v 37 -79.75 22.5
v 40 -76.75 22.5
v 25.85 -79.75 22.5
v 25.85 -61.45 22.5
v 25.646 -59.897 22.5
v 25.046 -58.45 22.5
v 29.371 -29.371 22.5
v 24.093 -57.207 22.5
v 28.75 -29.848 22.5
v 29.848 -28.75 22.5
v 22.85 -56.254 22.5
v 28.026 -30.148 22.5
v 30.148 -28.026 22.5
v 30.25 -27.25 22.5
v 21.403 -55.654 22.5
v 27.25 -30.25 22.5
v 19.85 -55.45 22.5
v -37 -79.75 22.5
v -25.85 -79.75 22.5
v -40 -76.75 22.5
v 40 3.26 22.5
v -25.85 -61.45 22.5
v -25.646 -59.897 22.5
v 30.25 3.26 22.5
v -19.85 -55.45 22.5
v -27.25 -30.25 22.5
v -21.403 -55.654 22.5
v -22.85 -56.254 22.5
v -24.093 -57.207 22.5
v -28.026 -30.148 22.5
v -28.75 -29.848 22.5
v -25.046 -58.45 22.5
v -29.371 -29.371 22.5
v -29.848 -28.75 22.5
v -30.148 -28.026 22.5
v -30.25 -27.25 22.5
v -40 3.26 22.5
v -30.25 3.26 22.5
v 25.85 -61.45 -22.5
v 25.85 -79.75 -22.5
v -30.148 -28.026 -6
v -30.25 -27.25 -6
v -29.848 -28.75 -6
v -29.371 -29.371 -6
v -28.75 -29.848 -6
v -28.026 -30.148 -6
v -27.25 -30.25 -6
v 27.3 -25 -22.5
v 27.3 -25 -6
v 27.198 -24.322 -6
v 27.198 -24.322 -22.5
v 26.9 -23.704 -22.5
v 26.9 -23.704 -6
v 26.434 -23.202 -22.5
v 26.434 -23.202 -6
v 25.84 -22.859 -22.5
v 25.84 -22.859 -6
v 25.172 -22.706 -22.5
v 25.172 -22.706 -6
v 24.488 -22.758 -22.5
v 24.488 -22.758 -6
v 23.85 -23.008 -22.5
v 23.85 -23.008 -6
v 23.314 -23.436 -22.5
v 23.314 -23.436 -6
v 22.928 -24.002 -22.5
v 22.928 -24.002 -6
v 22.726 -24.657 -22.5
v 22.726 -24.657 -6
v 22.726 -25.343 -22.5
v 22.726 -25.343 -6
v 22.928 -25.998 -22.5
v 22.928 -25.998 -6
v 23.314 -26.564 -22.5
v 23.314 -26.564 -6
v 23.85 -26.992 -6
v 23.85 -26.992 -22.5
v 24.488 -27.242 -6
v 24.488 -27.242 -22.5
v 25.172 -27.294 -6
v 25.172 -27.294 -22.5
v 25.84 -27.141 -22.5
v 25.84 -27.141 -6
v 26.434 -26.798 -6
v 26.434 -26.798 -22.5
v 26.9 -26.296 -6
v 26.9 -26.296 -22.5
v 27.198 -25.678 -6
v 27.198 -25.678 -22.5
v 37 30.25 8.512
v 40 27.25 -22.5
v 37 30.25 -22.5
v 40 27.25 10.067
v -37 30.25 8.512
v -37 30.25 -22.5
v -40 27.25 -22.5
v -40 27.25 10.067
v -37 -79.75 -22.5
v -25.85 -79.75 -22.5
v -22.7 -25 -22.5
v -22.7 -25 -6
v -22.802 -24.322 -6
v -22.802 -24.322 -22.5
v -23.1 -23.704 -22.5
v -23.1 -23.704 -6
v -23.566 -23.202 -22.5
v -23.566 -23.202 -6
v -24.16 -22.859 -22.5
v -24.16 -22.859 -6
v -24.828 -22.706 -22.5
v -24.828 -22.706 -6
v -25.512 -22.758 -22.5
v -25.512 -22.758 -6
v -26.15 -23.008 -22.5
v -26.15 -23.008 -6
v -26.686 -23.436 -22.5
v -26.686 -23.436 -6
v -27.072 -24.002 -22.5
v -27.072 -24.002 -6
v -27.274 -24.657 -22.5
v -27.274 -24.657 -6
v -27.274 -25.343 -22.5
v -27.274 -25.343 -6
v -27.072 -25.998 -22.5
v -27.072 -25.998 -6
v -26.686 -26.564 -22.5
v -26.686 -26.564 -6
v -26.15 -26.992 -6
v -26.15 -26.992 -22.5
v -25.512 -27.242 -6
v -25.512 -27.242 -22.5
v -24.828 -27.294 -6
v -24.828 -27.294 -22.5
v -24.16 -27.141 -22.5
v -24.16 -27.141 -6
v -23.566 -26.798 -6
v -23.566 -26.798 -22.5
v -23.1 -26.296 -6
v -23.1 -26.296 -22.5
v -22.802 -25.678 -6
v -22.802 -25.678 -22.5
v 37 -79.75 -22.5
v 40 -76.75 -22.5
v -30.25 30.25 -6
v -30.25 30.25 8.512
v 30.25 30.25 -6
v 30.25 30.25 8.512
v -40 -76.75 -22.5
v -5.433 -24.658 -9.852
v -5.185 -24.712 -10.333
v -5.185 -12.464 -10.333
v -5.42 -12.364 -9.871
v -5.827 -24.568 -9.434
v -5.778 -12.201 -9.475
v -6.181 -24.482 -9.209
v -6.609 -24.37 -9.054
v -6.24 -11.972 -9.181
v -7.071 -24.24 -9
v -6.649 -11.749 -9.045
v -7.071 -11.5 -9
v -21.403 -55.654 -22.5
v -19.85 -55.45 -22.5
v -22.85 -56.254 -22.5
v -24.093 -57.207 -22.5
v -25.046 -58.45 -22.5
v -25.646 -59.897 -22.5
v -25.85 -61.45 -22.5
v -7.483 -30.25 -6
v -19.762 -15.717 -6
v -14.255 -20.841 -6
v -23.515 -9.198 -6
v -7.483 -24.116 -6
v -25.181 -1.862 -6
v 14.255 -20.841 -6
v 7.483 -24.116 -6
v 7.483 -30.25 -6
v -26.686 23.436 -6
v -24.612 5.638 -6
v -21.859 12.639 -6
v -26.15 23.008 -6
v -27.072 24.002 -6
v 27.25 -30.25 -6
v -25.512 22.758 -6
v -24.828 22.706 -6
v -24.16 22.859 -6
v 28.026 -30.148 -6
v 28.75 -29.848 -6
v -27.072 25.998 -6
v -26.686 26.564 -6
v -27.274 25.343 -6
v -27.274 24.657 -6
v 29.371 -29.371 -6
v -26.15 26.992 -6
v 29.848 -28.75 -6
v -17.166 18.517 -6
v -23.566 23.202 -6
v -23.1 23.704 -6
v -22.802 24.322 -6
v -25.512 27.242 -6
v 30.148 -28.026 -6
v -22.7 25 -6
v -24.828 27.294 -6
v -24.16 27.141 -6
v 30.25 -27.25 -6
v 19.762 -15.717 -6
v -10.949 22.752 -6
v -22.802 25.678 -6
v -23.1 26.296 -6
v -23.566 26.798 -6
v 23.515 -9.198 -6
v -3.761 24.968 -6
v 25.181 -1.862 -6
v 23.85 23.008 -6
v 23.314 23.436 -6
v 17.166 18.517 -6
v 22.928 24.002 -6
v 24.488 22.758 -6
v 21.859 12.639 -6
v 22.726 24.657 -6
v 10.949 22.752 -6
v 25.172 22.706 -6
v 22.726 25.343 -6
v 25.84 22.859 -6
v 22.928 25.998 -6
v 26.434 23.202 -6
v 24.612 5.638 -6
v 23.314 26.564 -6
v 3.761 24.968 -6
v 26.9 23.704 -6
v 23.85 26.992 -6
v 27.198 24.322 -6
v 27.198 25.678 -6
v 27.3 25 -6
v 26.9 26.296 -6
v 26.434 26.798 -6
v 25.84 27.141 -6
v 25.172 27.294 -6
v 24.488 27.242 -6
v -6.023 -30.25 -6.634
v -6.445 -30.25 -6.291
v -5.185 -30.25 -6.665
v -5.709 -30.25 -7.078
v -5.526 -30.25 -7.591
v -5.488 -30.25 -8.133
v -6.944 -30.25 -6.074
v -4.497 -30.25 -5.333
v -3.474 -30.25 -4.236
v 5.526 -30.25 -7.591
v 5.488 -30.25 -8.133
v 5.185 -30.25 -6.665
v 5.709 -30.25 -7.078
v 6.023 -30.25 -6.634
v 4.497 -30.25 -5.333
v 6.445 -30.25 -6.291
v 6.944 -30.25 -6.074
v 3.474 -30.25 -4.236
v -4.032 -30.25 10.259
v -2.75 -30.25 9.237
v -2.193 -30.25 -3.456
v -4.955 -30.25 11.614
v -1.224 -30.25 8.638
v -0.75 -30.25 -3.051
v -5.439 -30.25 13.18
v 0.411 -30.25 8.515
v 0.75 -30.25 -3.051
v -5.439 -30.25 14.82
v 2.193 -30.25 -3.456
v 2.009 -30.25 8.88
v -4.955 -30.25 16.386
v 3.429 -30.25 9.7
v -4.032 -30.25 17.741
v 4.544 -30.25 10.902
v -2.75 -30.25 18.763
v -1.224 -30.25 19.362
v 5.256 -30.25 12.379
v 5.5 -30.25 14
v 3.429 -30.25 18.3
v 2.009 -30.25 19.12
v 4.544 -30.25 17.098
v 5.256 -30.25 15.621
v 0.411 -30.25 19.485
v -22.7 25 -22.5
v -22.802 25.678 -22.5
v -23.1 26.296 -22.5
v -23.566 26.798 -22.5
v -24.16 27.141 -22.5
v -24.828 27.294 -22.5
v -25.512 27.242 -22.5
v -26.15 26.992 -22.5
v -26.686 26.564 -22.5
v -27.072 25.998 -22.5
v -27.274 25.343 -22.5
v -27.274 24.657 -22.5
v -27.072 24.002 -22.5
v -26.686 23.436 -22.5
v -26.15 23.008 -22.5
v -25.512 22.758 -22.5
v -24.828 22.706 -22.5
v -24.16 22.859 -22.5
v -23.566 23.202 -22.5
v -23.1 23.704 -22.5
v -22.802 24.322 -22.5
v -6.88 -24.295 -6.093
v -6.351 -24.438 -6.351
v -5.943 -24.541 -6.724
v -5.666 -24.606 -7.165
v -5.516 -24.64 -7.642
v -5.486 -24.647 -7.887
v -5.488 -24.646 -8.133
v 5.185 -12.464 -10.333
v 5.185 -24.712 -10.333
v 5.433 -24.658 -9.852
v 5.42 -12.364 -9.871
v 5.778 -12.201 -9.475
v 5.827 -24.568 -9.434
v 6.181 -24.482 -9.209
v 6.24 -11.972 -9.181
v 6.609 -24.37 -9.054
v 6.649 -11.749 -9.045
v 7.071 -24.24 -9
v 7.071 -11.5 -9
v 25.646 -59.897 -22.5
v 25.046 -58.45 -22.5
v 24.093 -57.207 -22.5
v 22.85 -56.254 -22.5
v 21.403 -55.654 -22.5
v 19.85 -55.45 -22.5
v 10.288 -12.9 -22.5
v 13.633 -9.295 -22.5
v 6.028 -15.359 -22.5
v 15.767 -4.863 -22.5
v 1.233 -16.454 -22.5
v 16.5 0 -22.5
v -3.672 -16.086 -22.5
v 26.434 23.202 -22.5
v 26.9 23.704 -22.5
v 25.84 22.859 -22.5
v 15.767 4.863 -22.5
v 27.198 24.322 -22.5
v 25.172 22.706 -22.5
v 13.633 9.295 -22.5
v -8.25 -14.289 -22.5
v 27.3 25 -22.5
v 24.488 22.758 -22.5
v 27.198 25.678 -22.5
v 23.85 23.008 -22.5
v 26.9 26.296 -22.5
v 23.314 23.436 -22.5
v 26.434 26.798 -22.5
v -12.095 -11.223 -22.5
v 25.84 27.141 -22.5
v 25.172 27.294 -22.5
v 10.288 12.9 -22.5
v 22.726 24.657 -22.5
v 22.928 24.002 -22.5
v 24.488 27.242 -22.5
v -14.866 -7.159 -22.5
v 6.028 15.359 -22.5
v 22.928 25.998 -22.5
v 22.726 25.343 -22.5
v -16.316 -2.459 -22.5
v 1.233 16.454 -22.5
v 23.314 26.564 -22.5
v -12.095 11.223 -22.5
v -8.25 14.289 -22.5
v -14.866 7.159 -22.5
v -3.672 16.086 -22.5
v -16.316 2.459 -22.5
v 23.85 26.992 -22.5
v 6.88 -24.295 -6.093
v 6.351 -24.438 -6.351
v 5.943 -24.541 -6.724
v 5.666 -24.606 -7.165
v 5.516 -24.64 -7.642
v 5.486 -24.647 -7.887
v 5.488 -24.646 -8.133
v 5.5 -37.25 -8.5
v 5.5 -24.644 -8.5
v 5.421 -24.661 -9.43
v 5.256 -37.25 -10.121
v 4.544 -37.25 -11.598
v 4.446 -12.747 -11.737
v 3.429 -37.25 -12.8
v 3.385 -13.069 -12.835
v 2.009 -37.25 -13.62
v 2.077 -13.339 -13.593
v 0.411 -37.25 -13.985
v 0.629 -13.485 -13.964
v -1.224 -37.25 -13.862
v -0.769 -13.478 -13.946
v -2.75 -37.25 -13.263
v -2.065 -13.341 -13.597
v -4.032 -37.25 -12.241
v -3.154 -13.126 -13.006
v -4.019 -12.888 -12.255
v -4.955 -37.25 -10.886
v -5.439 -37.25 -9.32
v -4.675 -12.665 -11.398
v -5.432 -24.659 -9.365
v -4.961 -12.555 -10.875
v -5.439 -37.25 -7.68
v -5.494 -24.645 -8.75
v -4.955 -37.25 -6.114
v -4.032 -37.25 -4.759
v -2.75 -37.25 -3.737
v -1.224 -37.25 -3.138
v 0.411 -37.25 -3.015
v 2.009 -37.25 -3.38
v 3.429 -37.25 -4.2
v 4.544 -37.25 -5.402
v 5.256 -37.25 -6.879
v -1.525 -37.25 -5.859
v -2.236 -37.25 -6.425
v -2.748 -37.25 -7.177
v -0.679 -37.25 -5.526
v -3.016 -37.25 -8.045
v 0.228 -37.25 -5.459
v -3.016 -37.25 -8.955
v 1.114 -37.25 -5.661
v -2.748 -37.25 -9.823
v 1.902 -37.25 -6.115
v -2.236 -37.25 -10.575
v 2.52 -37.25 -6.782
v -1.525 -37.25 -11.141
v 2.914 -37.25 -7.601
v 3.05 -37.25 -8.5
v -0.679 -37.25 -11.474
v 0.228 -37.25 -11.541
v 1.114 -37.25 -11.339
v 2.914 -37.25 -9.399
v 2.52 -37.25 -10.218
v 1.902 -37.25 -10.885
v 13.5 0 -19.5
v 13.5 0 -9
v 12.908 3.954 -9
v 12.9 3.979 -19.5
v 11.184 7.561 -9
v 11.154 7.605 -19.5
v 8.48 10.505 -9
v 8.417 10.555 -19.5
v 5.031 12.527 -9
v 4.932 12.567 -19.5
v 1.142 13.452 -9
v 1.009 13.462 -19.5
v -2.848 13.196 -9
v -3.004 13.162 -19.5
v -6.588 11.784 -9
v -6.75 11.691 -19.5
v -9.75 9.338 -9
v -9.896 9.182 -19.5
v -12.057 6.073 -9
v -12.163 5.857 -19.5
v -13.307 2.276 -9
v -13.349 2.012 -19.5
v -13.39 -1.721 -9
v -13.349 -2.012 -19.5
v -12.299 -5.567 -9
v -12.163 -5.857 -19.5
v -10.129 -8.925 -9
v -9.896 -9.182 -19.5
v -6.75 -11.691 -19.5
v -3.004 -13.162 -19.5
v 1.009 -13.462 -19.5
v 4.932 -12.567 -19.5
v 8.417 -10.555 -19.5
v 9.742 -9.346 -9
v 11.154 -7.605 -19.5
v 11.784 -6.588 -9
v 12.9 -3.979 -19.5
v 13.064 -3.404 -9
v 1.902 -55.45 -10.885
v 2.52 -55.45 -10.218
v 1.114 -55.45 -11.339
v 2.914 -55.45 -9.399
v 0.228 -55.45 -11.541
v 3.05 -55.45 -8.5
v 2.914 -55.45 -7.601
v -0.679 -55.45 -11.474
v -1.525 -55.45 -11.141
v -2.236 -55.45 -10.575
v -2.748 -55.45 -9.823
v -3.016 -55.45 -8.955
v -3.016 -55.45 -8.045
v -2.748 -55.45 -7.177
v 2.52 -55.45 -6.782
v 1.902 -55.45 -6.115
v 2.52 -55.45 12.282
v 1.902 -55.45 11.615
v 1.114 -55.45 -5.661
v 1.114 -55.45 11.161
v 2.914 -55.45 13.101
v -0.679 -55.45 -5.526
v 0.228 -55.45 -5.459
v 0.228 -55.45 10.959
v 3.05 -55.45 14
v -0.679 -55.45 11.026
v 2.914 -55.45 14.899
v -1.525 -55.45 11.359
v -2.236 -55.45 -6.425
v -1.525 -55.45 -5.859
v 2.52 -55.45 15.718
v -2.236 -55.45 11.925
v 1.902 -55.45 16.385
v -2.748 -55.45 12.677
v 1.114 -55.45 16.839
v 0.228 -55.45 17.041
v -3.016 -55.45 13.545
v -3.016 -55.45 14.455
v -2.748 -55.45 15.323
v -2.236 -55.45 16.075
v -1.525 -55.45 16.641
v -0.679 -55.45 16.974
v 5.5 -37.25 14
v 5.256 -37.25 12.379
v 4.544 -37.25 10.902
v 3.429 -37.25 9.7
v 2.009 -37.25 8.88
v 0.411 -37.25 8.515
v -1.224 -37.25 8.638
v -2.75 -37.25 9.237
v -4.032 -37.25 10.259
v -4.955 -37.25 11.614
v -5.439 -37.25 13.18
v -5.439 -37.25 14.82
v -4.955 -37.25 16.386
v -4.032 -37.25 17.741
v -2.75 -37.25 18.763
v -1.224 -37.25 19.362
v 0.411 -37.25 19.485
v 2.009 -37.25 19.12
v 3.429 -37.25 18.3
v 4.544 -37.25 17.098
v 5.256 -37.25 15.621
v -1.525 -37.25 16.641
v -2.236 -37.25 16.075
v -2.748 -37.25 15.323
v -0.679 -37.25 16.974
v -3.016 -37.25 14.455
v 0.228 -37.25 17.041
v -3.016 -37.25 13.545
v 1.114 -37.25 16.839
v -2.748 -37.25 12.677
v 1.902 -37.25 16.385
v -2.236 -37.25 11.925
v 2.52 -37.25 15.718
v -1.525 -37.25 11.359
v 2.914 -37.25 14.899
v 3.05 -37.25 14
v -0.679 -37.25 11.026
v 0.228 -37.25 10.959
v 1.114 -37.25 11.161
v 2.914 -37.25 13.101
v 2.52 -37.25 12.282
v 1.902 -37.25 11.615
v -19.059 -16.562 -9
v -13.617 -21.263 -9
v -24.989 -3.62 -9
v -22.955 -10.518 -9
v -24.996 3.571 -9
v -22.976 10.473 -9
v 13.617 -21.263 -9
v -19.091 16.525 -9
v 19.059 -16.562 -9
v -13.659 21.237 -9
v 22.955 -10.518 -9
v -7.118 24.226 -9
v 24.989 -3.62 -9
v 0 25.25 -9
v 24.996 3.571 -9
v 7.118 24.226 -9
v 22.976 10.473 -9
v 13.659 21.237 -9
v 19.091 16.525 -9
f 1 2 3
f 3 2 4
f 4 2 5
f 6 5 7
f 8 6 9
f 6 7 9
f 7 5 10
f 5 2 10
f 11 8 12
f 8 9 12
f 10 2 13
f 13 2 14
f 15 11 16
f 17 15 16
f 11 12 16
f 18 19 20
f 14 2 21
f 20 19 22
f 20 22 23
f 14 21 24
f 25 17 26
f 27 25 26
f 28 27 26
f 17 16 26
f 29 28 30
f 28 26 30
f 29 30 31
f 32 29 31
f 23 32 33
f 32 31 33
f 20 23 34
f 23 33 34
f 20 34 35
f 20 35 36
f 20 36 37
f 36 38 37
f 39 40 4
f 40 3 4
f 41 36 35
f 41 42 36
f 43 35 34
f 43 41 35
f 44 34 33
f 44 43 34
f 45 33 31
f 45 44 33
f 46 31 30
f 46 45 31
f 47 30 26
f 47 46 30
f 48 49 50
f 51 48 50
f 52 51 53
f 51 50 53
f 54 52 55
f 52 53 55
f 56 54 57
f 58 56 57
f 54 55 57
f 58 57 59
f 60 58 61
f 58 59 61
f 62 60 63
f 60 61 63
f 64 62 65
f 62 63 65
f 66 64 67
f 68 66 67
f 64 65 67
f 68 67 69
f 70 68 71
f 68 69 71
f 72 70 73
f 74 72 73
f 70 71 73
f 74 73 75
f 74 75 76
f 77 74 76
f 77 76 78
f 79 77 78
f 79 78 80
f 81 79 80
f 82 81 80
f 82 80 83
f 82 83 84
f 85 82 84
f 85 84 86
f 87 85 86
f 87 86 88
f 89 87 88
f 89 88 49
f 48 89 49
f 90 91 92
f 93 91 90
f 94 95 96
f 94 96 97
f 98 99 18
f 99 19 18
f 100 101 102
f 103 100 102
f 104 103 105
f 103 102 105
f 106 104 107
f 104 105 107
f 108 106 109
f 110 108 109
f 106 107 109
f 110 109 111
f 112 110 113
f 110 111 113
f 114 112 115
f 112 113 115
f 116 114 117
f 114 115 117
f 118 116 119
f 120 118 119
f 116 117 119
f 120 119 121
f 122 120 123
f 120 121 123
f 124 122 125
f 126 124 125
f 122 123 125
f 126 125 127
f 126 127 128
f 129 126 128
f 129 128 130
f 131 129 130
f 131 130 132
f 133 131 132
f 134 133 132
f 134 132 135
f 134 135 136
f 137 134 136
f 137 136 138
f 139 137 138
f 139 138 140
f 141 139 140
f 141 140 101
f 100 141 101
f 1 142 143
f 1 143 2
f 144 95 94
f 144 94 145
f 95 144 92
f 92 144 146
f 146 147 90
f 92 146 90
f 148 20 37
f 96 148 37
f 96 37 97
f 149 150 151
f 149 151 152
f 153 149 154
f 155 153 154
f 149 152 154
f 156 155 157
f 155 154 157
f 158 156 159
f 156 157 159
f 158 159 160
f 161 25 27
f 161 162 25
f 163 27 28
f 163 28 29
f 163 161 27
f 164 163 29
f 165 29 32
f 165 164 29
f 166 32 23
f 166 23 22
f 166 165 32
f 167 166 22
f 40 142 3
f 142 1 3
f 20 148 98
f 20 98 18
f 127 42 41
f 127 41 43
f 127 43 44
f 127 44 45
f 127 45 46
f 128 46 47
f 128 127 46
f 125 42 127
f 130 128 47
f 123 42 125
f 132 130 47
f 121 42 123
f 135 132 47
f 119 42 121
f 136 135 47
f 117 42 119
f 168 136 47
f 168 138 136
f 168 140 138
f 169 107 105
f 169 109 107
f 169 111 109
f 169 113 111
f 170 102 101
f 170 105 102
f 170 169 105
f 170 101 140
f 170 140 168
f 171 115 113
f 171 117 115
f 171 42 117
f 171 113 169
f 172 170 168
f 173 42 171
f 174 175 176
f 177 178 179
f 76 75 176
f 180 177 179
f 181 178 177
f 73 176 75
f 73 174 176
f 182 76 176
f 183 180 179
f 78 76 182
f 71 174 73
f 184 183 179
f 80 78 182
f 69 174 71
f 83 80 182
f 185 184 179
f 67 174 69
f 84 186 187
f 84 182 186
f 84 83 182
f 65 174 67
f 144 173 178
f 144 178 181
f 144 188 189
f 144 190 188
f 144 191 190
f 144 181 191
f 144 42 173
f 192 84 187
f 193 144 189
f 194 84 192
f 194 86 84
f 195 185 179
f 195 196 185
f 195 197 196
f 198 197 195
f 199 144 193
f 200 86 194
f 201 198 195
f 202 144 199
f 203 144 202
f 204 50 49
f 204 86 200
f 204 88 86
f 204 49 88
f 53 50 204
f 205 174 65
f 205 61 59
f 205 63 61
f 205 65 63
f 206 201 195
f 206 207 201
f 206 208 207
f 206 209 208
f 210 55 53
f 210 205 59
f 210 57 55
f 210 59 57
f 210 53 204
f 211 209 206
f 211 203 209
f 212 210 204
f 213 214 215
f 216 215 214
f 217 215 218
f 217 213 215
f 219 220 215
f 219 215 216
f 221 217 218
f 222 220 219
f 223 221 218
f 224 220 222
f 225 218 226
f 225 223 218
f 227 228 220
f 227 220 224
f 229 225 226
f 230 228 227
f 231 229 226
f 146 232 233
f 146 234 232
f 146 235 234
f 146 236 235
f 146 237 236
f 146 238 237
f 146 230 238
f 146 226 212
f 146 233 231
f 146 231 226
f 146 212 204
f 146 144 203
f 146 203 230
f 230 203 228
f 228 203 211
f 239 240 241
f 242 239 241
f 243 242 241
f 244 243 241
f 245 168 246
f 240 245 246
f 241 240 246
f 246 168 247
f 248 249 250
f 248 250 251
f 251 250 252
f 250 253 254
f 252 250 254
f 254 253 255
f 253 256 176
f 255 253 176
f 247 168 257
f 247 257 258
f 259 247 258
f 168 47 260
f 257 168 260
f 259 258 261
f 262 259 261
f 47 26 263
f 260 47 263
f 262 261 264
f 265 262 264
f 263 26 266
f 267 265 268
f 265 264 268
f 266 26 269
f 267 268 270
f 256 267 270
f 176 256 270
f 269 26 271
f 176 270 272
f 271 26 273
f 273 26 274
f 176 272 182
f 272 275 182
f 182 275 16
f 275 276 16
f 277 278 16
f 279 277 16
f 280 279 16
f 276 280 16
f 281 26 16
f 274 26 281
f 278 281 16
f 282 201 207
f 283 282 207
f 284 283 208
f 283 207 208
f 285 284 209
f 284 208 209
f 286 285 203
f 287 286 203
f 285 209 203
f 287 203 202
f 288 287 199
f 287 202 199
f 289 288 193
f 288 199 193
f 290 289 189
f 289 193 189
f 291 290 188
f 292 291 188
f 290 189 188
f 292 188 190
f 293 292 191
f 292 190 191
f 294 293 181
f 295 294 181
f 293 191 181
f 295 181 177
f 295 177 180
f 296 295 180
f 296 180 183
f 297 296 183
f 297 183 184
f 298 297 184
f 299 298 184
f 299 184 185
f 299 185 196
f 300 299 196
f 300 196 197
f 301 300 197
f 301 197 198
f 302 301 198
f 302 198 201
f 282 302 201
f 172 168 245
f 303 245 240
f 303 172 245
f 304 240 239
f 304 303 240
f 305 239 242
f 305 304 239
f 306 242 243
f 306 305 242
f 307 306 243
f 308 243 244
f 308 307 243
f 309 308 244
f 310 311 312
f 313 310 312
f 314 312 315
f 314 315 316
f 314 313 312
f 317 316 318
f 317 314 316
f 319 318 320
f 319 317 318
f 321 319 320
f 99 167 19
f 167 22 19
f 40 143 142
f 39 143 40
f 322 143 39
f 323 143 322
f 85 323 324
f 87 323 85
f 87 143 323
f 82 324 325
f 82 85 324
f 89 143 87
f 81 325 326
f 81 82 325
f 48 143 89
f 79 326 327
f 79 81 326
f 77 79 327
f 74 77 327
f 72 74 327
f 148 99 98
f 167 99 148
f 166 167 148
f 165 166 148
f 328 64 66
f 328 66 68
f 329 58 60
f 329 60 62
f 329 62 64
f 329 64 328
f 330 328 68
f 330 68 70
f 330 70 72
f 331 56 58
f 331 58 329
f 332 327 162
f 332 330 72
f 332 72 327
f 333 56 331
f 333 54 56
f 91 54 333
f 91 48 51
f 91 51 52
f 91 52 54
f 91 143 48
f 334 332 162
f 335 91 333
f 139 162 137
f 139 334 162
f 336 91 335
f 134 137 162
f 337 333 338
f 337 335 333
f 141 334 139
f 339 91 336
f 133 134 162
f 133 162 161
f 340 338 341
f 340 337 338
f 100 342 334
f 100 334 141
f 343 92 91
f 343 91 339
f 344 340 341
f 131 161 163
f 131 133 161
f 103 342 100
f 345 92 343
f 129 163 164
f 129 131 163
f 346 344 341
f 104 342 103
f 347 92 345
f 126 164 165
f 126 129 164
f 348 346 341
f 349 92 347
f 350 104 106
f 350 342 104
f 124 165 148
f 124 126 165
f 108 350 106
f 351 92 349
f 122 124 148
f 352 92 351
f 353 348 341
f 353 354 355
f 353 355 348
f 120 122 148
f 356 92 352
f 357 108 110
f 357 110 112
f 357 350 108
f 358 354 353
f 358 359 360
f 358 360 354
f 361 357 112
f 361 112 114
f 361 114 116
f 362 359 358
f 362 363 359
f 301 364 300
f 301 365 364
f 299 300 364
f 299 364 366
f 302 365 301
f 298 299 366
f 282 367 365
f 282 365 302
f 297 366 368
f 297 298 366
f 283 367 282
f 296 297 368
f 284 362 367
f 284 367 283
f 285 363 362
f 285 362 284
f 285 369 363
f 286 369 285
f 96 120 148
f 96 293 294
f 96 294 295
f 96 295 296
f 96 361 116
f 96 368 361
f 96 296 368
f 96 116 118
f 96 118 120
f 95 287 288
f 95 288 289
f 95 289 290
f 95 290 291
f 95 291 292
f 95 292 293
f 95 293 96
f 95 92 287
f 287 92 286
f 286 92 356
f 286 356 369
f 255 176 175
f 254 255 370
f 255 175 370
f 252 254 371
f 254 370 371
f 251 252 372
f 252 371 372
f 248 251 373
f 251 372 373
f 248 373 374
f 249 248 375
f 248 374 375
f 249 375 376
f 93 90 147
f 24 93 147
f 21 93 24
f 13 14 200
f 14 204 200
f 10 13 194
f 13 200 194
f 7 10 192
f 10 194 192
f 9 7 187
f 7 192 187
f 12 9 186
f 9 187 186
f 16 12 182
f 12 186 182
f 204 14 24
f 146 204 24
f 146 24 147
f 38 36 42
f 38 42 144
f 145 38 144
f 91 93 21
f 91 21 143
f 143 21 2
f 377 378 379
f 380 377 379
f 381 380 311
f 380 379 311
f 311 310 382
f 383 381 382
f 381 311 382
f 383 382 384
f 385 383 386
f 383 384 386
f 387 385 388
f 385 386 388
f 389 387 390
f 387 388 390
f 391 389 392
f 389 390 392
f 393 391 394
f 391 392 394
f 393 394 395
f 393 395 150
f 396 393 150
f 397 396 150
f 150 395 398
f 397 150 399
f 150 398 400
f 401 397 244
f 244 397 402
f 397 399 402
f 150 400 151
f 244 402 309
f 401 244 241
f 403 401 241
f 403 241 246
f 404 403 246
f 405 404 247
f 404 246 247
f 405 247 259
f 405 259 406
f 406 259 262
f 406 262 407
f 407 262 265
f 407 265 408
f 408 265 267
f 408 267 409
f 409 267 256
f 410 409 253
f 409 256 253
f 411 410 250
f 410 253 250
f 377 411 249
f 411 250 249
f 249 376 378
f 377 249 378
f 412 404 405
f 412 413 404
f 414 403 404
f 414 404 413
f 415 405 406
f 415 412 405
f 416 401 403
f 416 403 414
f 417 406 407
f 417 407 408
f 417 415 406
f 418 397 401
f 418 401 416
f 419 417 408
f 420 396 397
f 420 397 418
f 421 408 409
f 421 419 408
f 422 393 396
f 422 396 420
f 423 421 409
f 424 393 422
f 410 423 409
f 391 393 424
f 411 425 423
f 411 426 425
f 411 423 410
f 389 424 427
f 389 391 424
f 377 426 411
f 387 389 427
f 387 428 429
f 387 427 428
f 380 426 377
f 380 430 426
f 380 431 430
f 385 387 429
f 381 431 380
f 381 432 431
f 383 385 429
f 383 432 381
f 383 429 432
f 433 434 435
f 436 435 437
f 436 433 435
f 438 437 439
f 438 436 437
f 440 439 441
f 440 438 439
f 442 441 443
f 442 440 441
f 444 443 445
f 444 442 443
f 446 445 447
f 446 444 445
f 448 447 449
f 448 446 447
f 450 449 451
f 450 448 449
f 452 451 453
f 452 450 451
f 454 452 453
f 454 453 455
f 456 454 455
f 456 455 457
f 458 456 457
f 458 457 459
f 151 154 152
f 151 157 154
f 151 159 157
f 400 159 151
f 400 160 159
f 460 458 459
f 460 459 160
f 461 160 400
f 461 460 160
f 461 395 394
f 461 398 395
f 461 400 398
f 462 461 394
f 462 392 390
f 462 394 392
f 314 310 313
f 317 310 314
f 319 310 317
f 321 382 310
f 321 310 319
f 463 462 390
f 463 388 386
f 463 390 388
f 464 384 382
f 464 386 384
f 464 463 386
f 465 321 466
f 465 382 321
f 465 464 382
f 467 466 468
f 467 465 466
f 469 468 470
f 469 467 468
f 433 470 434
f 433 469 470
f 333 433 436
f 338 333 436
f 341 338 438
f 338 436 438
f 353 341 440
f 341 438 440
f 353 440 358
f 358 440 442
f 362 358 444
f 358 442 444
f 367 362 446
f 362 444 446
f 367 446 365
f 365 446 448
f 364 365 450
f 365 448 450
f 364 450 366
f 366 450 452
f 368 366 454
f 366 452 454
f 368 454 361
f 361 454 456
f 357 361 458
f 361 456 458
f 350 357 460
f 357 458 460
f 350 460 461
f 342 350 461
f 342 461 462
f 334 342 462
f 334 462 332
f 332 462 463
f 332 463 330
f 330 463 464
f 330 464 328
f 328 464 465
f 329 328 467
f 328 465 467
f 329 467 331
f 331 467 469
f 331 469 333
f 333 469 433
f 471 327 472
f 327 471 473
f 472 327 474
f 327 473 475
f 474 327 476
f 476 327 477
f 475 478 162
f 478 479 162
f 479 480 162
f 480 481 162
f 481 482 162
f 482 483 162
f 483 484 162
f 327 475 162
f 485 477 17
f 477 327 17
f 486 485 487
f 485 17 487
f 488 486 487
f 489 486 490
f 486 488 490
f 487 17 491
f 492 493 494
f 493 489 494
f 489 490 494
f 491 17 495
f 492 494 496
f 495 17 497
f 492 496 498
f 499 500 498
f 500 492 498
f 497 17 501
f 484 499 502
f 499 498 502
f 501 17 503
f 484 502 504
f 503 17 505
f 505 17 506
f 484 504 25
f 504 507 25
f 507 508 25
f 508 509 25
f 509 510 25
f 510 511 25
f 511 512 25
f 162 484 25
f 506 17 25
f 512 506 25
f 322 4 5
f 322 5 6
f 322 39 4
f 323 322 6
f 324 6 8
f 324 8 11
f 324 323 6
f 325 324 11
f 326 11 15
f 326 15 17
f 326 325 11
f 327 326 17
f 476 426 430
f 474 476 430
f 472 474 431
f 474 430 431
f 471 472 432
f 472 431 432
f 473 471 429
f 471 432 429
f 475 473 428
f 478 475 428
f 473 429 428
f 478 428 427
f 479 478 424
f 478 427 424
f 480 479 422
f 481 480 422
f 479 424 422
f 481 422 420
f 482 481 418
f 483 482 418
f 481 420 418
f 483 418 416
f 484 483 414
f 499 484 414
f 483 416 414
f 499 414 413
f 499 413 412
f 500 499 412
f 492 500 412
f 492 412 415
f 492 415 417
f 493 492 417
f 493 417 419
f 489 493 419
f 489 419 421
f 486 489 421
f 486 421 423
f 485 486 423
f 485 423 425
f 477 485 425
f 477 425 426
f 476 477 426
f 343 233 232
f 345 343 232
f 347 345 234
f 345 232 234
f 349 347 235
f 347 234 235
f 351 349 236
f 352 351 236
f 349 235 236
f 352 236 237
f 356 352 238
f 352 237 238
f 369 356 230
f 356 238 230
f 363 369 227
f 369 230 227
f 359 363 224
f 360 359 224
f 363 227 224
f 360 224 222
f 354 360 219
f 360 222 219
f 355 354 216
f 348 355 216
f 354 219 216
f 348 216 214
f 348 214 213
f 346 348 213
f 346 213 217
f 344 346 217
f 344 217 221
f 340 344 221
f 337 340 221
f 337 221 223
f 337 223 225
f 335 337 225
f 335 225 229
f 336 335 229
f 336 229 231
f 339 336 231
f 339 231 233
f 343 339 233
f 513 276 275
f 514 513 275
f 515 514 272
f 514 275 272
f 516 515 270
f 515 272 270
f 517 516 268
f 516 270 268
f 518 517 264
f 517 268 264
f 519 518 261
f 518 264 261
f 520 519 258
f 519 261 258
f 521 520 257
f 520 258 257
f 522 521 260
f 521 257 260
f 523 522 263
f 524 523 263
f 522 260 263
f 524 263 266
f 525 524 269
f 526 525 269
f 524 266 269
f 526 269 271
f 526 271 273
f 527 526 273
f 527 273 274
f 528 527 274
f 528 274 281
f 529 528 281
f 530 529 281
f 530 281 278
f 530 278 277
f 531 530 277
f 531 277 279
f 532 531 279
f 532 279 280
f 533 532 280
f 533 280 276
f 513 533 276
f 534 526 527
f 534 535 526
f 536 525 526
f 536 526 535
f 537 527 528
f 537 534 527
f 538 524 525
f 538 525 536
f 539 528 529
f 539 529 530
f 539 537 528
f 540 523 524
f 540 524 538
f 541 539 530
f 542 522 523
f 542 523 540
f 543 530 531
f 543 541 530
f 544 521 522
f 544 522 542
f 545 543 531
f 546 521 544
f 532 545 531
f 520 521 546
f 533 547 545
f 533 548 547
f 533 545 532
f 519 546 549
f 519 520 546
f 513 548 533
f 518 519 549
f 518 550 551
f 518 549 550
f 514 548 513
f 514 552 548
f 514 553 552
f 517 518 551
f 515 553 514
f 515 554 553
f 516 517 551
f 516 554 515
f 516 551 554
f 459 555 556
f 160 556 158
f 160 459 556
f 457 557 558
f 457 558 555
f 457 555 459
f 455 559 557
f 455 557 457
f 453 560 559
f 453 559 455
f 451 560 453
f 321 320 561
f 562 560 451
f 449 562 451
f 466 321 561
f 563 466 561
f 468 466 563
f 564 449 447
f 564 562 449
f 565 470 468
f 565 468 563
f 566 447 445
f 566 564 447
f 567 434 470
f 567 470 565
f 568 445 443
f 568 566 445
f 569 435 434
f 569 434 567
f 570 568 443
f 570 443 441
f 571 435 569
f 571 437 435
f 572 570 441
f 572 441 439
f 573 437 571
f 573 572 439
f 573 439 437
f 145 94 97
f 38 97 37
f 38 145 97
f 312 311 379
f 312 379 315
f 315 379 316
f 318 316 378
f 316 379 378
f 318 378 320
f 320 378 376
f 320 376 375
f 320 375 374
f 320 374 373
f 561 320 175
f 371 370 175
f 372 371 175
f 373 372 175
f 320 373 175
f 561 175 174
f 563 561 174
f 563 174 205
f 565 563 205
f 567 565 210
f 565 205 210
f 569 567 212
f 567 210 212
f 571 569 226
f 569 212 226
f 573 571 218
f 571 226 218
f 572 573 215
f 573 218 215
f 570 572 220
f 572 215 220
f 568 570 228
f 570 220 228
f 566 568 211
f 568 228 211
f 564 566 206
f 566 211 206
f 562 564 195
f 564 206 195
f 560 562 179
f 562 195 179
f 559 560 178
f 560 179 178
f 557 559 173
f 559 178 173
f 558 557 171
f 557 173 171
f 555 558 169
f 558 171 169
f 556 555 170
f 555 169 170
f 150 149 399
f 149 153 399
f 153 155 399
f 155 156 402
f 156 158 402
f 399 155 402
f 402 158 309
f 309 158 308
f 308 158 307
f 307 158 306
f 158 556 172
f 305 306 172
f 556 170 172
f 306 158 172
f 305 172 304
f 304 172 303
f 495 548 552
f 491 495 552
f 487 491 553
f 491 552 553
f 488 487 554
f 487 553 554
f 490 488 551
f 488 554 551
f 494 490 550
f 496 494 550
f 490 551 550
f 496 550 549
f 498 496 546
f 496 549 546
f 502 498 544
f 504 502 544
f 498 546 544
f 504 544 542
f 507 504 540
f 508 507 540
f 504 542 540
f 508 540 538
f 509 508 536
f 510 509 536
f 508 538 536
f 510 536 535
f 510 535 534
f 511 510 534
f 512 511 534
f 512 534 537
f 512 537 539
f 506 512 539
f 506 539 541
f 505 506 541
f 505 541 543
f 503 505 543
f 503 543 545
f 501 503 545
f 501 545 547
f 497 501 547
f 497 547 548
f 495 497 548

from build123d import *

# Parameters (mm, degrees)
SKETCH1_R               = 13.5
BOSS_EXTRUDE1_DEPTH     = 22.5
SKETCH2_W               = 60.5
SKETCH2_H               = 60.5
CUT_EXTRUDE1_DEPTH      = 28.5
SKETCH3_R               = 25.25
CUT_EXTRUDE2_DEPTH      = 3
SKETCH4_R               = 2.3
CUT_EXTRUDE3_DEPTH      = 29.5
CUT_EXTRUDE3_DEPTH_BACK = 17.5
CHAMFER1_SIZE           = 3
SKETCH5_R               = 3.05
CUT_EXTRUDE4_DEPTH      = 80.75
SKETCH6_R               = 5.5
CUT_EXTRUDE5_DEPTH      = 37.25
FILLET1_R               = 3
FILLET2_R               = 6
FILLET3_R               = 2
CHAMFER2_SIZE           = 3
CUT_EXTRUDE6_DEPTH      = 1
CUT_EXTRUDE6_DEPTH_BACK = 81


with BuildPart() as part:
    # Sketch1 → Boss-Extrude1 (new body, symmetric)
    with BuildSketch(Plane.XY):
        Polygon((40, -79.75), (25.85, -79.75), (25.85, -55.45), (-25.85, -55.45), (-25.85, -79.75), (-40, -79.75), (-40, 30.25), (40, 30.25), align=None)
        Circle(SKETCH1_R, mode=Mode.SUBTRACT)
    extrude(amount=BOSS_EXTRUDE1_DEPTH, both=True)

    # Sketch2 → Cut-Extrude1 (cut)
    with BuildSketch(Plane.XY.offset(22.5)):
        Rectangle(SKETCH2_W, SKETCH2_H)
    extrude(amount=-CUT_EXTRUDE1_DEPTH, mode=Mode.SUBTRACT)

    # Sketch3 → Cut-Extrude2 (cut)
    with BuildSketch(Plane.XY.offset(-6)):
        Circle(SKETCH3_R)
    extrude(amount=-CUT_EXTRUDE2_DEPTH, mode=Mode.SUBTRACT)

    # Sketch4 → Cut-Extrude3 (cut, two sides)
    with BuildSketch(Plane.XY.offset(-6)) as cut_extrude3_sk:
        with Locations((-25, 25)):
            Circle(SKETCH4_R)
        with Locations((25, 25)):
            Circle(SKETCH4_R)
        with Locations((25, -25)):
            Circle(SKETCH4_R)
        with Locations((-25, -25)):
            Circle(SKETCH4_R)
    extrude(amount=CUT_EXTRUDE3_DEPTH, mode=Mode.SUBTRACT)
    extrude(cut_extrude3_sk.sketch, amount=-CUT_EXTRUDE3_DEPTH_BACK, mode=Mode.SUBTRACT)

    # Chamfer1
    chamfer1_edges = [part.edges().sort_by_distance(p)[0] for p in [
        (-13.5, 0, -22.5),
    ]]
    chamfer(chamfer1_edges, length=CHAMFER1_SIZE)

    # Sketch5 → Cut-Extrude4 (cut, through all)
    with BuildSketch(Plane(origin=(0, 0, 0), x_dir=(1, 0, 0), z_dir=(0, 1, 0))):
        with Locations((0, 8.5)):
            Circle(SKETCH5_R)
        with Locations((0, -14)):
            Circle(SKETCH5_R)
    extrude(amount=-CUT_EXTRUDE4_DEPTH, mode=Mode.SUBTRACT)

    # Sketch6 → Cut-Extrude5 (cut)
    with BuildSketch(Plane(origin=(0, 0, 0), x_dir=(1, 0, 0), z_dir=(0, 1, 0))):
        with Locations((0, -14)):
            Circle(SKETCH6_R)
        with Locations((0, 8.5)):
            Circle(SKETCH6_R)
    extrude(amount=-CUT_EXTRUDE5_DEPTH, mode=Mode.SUBTRACT)

    # Fillet1
    fillet1_edges = [part.edges().sort_by_distance(p)[0] for p in [
        (-30.25, -30.25, 8.25),
        (30.25, -30.25, 8.25),
    ]]
    fillet(fillet1_edges, radius=FILLET1_R)

    # Fillet2
    fillet2_edges = [part.edges().sort_by_distance(p)[0] for p in [
        (25.85, -55.45, 0),
        (-25.85, -55.45, 0),
    ]]
    fillet(fillet2_edges, radius=FILLET2_R)

    # Fillet3
    fillet3_edges = [part.edges().sort_by_distance(p)[0] for p in [
        (5.477225575, -18.493872805, -9),
        (-5.477225575, -18.493872805, -9),
        (4.898979486, -27.510096891, -6),
        (-4.898979486, -27.510096891, -6),
    ]]
    fillet(fillet3_edges, radius=FILLET3_R)

    # Chamfer2
    chamfer2_edges = [part.edges().sort_by_distance(p)[0] for p in [
        (-40, 30.25, 0),
        (40, 30.25, 0),
        (40, -79.75, 0),
        (-40, -79.75, 0),
    ]]
    chamfer(chamfer2_edges, length=CHAMFER2_SIZE)

    # Sketch7 → Cut-Extrude6 (cut, two sides)
    with BuildSketch(Plane(origin=(40, 0, 0), x_dir=(0, 0, -1), z_dir=(1, 0, 0))) as cut_extrude6_sk:
        Polygon((-8.512452887, 30.25), (-22.5, 3.260250001), (-22.5, 30.25), align=None)
    extrude(amount=CUT_EXTRUDE6_DEPTH, mode=Mode.SUBTRACT)
    extrude(cut_extrude6_sk.sketch, amount=-CUT_EXTRUDE6_DEPTH_BACK, mode=Mode.SUBTRACT)


solid = part.part
